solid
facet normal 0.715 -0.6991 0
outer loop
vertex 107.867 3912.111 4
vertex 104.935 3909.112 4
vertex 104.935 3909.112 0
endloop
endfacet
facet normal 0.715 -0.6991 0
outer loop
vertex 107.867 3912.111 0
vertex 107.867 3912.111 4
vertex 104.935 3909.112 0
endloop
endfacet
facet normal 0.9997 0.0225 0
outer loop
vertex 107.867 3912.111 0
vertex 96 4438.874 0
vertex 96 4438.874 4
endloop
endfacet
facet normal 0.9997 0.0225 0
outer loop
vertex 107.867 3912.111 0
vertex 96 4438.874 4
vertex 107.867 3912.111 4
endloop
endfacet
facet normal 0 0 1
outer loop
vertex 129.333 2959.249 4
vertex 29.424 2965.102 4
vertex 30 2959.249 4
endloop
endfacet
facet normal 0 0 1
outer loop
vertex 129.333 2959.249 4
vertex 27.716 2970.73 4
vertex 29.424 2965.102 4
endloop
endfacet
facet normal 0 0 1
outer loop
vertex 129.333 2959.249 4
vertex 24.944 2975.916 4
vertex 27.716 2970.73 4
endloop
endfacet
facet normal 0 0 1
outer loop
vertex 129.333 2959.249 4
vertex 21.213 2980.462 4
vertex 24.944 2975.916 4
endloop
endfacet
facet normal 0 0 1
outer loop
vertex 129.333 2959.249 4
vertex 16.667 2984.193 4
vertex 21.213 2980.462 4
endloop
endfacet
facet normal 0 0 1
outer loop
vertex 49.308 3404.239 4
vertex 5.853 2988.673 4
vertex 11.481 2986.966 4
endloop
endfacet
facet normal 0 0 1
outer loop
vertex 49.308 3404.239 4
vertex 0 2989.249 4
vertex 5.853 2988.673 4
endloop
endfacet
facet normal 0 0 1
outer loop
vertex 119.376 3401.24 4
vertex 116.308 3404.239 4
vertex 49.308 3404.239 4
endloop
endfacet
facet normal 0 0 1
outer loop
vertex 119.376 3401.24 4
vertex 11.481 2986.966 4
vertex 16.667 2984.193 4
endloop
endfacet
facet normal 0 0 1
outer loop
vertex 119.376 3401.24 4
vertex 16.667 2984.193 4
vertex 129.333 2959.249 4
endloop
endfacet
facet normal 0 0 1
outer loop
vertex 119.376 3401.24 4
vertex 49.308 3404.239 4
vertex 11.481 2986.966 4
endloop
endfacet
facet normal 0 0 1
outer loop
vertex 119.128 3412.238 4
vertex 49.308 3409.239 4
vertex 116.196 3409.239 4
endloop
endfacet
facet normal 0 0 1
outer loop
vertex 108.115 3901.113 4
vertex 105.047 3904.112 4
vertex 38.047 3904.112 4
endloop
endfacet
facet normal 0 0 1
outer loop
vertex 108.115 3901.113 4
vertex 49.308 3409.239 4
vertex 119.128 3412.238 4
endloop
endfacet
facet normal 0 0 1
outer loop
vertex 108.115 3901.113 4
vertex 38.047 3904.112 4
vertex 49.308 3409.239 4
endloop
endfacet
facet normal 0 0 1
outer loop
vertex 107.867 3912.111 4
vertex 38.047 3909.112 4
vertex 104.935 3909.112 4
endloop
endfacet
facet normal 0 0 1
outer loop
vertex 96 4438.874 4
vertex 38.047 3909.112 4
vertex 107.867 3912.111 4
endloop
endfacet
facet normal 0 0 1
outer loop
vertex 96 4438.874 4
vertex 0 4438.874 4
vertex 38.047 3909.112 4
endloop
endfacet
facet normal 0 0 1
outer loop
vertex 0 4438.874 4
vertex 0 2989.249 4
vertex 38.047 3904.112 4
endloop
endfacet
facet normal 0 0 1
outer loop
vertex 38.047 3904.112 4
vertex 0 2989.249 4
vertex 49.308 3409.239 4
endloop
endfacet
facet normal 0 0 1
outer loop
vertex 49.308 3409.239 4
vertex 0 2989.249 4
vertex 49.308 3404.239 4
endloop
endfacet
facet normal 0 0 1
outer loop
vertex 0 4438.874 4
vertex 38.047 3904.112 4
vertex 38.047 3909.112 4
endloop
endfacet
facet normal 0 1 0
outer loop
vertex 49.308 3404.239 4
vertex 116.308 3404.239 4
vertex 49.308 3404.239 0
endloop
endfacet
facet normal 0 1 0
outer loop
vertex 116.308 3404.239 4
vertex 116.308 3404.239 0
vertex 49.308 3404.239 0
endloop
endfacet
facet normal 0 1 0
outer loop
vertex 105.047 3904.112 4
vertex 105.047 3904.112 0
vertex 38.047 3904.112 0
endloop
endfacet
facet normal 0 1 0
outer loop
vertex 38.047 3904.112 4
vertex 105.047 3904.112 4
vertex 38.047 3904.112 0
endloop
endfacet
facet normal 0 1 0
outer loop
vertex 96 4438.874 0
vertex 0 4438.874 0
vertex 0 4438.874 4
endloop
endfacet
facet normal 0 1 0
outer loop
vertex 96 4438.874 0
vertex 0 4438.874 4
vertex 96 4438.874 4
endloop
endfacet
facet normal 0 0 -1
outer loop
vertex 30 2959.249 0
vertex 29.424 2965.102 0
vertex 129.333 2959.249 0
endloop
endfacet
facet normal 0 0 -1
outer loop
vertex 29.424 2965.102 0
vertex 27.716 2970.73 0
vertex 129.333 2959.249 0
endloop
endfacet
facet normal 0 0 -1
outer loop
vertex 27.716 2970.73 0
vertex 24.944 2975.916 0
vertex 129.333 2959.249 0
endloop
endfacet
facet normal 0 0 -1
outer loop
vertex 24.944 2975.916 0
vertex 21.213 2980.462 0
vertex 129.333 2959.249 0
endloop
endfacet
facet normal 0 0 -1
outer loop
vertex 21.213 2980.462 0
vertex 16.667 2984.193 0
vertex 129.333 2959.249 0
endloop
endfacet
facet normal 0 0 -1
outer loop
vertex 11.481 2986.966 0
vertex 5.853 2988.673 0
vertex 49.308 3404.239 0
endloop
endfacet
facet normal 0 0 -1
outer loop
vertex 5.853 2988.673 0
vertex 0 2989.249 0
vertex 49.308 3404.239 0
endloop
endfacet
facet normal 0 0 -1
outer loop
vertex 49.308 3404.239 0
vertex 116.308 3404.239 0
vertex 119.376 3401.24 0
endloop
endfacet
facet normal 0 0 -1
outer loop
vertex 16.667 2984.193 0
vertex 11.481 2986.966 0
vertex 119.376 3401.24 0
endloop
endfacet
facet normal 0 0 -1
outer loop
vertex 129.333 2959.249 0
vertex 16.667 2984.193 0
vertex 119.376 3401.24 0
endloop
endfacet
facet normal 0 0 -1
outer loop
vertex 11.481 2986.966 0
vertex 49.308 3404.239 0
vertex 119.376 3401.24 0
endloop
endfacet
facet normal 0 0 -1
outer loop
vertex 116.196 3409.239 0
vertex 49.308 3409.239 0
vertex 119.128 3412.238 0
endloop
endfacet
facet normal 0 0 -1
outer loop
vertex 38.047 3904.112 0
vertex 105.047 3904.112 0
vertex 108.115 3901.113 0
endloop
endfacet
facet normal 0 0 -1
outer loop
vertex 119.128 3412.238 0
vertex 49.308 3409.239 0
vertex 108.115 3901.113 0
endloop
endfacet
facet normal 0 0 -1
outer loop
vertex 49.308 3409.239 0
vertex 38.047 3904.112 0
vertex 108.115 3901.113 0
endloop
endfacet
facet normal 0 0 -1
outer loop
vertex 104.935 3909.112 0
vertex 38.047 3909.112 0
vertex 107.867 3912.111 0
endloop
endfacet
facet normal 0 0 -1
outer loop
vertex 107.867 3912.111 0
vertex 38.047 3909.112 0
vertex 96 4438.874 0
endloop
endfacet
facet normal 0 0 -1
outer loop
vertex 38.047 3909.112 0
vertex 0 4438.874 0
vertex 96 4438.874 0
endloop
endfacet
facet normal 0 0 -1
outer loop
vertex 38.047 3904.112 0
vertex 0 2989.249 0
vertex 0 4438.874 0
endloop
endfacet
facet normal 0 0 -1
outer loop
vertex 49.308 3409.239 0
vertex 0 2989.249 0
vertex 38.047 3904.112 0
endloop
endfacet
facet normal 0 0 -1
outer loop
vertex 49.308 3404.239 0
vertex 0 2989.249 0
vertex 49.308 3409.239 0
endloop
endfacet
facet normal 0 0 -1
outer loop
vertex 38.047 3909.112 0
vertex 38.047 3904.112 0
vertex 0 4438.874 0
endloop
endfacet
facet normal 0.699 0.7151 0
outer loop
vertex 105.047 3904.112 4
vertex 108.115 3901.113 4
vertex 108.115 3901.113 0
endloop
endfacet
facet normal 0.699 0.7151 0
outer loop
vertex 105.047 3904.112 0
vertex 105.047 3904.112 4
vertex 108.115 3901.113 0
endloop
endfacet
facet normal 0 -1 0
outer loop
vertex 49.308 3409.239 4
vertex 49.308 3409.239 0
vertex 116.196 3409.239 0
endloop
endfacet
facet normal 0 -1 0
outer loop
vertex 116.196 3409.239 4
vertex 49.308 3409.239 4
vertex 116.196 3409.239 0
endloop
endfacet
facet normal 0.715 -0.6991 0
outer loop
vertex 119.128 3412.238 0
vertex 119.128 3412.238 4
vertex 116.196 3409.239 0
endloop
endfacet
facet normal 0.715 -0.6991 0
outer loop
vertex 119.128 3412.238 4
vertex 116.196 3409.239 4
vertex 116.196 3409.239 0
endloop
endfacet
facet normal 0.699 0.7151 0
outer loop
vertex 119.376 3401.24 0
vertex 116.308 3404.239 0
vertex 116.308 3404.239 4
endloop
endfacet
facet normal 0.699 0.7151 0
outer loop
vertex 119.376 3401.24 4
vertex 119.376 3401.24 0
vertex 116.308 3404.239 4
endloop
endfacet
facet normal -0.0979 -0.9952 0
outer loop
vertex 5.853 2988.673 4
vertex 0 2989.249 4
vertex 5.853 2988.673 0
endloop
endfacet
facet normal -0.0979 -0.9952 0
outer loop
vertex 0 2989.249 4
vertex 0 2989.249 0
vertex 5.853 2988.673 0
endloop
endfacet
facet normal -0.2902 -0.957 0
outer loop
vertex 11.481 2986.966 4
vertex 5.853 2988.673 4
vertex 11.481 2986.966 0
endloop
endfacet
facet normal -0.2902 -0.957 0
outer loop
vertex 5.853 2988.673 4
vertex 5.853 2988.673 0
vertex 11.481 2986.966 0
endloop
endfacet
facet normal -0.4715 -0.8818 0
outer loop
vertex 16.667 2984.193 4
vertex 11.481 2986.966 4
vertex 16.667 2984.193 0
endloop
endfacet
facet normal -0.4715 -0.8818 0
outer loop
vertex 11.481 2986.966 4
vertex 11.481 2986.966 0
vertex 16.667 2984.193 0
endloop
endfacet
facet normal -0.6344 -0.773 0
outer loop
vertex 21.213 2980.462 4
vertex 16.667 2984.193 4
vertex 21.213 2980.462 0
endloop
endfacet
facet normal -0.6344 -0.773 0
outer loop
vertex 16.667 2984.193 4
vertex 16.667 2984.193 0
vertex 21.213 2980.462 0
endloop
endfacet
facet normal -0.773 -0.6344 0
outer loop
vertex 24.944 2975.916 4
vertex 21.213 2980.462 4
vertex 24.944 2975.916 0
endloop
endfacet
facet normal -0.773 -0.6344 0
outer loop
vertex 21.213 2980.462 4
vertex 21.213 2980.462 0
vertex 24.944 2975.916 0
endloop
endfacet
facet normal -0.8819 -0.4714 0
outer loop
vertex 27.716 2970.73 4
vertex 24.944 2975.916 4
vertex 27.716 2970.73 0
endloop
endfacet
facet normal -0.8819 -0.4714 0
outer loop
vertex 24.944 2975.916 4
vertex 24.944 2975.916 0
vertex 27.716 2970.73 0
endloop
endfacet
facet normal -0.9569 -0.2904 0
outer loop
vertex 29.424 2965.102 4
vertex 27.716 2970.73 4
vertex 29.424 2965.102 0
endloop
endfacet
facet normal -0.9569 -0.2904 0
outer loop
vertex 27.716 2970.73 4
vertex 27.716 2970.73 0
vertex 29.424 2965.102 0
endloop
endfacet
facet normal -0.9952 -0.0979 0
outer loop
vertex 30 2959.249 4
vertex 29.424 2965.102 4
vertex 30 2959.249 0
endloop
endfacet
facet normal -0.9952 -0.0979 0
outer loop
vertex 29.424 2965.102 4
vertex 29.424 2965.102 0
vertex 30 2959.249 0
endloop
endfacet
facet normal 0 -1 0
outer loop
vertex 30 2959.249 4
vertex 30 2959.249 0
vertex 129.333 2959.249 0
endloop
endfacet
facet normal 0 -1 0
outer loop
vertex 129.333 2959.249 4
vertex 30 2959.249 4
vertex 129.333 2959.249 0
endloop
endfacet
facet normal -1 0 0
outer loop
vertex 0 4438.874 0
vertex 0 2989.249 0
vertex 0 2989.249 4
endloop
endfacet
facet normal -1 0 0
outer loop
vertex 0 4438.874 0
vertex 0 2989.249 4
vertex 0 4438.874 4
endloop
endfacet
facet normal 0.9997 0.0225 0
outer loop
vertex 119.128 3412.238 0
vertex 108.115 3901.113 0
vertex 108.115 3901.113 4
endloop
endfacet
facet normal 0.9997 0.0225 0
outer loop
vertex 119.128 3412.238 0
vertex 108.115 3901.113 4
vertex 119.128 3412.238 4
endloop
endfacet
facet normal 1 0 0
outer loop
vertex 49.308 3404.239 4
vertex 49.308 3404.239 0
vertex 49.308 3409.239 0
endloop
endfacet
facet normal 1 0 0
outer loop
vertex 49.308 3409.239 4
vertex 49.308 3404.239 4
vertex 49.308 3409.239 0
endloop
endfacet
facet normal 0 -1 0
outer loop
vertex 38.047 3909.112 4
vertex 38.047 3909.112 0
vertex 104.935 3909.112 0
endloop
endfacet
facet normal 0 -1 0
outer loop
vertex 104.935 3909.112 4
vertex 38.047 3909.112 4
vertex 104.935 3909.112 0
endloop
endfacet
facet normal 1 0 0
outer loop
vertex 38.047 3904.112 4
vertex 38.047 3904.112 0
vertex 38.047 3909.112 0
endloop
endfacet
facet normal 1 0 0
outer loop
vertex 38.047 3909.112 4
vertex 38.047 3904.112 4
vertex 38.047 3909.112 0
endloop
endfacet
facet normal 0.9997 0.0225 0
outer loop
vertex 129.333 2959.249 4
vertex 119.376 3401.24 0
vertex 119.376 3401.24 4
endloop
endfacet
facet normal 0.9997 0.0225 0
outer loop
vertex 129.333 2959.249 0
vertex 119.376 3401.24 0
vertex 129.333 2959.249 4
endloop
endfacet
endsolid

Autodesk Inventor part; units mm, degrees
ref_plane "YZ Plane" through (0, 0, 0) normal (1, 0, 0) x (0, 1, 0)
ref_plane "XZ Plane" through (0, 0, 0) normal (0, 1, 0) x (-1, 0, 0)
ref_plane "XY Plane" through (0, 0, 0) normal (0, 0, 1) x (1, 0, 0)
sketch "Sketch1" plane through (0, 0, 0) normal (0, 0, 1) x (1, 0, 0)
  line L0 (0, 0) -> (0, 4438.8737)
  line L1 (0, 4438.8737) -> (96, 4438.8737)
  line L2 (96, 4438.8737) -> (196, 0)
  line L3 (196, 0) -> (0, 0)
  circle A0 centre (0, 0) radius 30
  line L4 (0, 1479.6246) -> (162.6667, 1479.6246)
  line L5 (0, 2959.2492) -> (129.3333, 2959.2492)
  circle A1 centre (0, 1479.6246) radius 30
  circle A2 centre (0, 2959.2492) radius 30
  line L6 (186.8761, 405) -> (116.8761, 405)
  line L7 (116.8761, 405) -> (116.8761, 410)
  line L8 (116.8761, 410) -> (186.8761, 410)
  line L9 (186.8761, 410) -> (186.8761, 405)
  line L10 (105.6148, 909.8732) -> (175.6148, 909.8732)
  line L11 (175.6148, 904.8732) -> (105.6148, 904.8732)
  line L12 (105.6148, 904.8732) -> (105.6148, 909.8732)
  line L13 (175.6148, 909.8732) -> (175.6148, 904.8732)
  line L14 (94.3535, 1409.7463) -> (164.3535, 1409.7463)
  line L15 (164.3535, 1404.7463) -> (94.3535, 1404.7463)
  line L16 (94.3535, 1404.7463) -> (94.3535, 1409.7463)
  line L17 (164.3535, 1409.7463) -> (164.3535, 1404.7463)
  line L18 (83.0923, 1909.6195) -> (153.0923, 1909.6195)
  line L19 (153.0923, 1904.6195) -> (83.0923, 1904.6195)
  line L20 (83.0923, 1904.6195) -> (83.0923, 1909.6195)
  line L21 (153.0923, 1909.6195) -> (153.0923, 1904.6195)
  line L22 (71.831, 2409.4927) -> (141.831, 2409.4927)
  line L23 (141.831, 2404.4927) -> (71.831, 2404.4927)
  line L24 (71.831, 2404.4927) -> (71.831, 2409.4927)
  line L25 (141.831, 2409.4927) -> (141.831, 2404.4927)
  line L26 (60.5698, 2909.3658) -> (130.5698, 2909.3658)
  line L27 (130.5698, 2904.3658) -> (60.5698, 2904.3658)
  line L28 (60.5698, 2904.3658) -> (60.5698, 2909.3658)
  line L29 (130.5698, 2909.3658) -> (130.5698, 2904.3658)
  line L30 (49.3085, 3409.239) -> (119.3085, 3409.239)
  line L31 (119.3085, 3404.239) -> (49.3085, 3404.239)
  line L32 (49.3085, 3404.239) -> (49.3085, 3409.239)
  line L33 (119.3085, 3409.239) -> (119.3085, 3404.239)
  line L34 (38.0472, 3909.1122) -> (108.0472, 3909.1122)
  line L35 (108.0472, 3904.1122) -> (38.0472, 3904.1122)
  line L36 (38.0472, 3904.1122) -> (38.0472, 3909.1122)
  line L37 (108.0472, 3909.1122) -> (108.0472, 3904.1122)
  line L38 (0, 1629.6246) -> (159.2874, 1629.6246)
  line L39 (0, 3079.2492) -> (126.6299, 3079.2492)
  point P0 (30, 2959.2492)
  point P1 (0, 2929.2492)
  point P2 (0, 1509.6246)
  point P3 (0, 1449.6246)
  point P4 (0, 30)
  point P5 (30, 0)
  point P6 (186.7634, 410)
  point P7 (175.5022, 909.8732)
  point P8 (164.2409, 1409.7463)
  point P9 (30, 1479.6246)
  point P10 (153.0923, 1904.6195)
  point P11 (152.9796, 1909.6195)
  point P12 (141.831, 2404.4927)
  point P13 (141.7184, 2409.4927)
  point P14 (130.5698, 2904.3658)
  point P15 (130.4571, 2909.3658)
  point P16 (0, 2989.2492)
  point P17 (119.3085, 3404.239)
  point P18 (119.1959, 3409.239)
  point P19 (108.0472, 3904.1122)
  point P20 (107.9346, 3909.1122)
  dimension "d65" = 96
  dimension "d67" = 196
  dimension "d68" = 60
  dimension "d69" = 1480
  dimension "d70" = 1480
  dimension "d71" = 1480
  dimension "d72" = 5
  dimension "d73" = 70
  dimension "d74" = 410
  dimension "d77" = 500
  dimension "d82" = 120
  dimension "d83" = 150
extrude "Plate3" add sketch "Sketch1" along normal blind 4 contours L39 L2 L5 A2 L0 | L0 L1 L2 L34 L36 L35 L30 L32 L31 L39
chamfer "Corner Chamfer2" distance 3 angle 45 4 edges at (119.3085, 3404.239, 2) (119.1959, 3409.239, 2) (108.0472, 3904.1122, 2) (107.9346, 3909.1122, 2)
equation "\"BendRadius\" = Thickness"
equation "\"BendReliefWidth\" = Thickness"
equation "\"BendReliefDepth\" = 0.5 * Thickness"
equation "\"CornerReliefSize\" = 4 * Thickness"
equation "\"MinimumRemnant\" = 2 * Thickness"
equation "\"TransitionRadius\" = BendRadius"
equation "\"JacobiRadiusSize\" = BendRadius"
equation "\"GapSize\" = Thickness"
equation "\"Thickness\" = 4"
properties part number "GBK 3301 Center third rib" material "Steel"
